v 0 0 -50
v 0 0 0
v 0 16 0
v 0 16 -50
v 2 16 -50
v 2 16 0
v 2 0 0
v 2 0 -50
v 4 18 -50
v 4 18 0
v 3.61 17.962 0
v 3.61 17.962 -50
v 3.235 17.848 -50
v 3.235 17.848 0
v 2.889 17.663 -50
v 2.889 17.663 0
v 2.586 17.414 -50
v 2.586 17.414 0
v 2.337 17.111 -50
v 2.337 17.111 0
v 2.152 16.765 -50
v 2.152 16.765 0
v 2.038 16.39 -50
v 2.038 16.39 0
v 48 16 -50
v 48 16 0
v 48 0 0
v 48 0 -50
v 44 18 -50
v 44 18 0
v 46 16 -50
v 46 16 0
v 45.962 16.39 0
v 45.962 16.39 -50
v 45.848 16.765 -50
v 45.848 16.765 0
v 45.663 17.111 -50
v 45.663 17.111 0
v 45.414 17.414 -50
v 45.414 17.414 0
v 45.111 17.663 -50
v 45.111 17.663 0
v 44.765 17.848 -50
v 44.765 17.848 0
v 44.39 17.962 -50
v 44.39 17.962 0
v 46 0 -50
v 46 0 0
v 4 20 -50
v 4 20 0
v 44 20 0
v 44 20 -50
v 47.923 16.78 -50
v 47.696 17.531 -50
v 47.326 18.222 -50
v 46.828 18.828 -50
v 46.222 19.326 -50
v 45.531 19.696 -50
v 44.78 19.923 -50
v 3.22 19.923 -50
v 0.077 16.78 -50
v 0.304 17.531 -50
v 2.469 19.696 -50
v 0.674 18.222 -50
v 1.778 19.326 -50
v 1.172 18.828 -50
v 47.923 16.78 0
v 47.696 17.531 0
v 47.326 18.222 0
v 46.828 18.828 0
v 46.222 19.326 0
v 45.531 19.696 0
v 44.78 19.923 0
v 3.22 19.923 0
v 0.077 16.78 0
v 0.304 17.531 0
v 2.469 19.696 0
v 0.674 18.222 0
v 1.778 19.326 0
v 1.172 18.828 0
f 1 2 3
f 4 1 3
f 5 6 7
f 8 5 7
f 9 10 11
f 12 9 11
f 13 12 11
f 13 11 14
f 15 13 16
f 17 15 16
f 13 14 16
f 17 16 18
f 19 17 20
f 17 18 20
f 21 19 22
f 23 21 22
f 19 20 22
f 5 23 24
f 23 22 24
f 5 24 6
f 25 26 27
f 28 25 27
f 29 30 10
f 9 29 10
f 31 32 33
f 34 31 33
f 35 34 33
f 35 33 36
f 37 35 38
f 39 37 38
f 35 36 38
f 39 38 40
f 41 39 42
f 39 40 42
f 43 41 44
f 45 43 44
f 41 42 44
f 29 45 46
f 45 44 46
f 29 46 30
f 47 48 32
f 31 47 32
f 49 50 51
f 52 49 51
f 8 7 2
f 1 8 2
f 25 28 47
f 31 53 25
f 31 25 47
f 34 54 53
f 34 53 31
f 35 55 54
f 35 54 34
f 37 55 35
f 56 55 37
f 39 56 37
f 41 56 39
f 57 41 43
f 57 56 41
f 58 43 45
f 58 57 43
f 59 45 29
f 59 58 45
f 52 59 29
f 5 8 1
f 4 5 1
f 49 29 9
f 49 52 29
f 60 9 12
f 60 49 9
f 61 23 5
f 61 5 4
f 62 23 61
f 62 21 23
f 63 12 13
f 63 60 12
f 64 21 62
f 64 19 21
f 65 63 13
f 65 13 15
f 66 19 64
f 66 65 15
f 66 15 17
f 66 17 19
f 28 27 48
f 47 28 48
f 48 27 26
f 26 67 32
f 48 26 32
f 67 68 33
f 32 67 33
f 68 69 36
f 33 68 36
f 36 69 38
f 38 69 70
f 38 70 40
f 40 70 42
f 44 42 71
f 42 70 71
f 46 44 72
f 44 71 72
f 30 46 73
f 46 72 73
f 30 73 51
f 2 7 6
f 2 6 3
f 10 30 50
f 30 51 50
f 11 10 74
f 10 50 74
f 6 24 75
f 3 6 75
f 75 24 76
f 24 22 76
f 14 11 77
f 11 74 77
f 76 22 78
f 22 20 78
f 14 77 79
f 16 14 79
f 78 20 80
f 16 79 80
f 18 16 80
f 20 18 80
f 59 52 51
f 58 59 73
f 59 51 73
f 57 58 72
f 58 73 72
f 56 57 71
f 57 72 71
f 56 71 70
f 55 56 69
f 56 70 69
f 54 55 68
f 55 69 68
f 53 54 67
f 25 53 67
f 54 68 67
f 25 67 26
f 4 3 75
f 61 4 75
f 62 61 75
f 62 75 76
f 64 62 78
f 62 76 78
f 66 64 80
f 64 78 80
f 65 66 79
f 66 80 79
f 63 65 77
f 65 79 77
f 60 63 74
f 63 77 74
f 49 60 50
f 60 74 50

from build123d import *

# Parameters (mm, degrees)
SM_BASE_FLANGE_1_DEPTH = 50


# Sheet-metal steps are written as plain solids
with BuildPart() as part:
    # Sketch 1 → Базовая кромка1 (new body)
    with BuildSketch(Plane.XY):
        with BuildLine():
            Line((0, 0), (0, 16))
            ThreePointArc((0, 16), (1.171572875, 18.828427125), (4, 20))
            Line((4, 20), (44, 20))
            ThreePointArc((44, 20), (46.828427125, 18.828427125), (48, 16))
            Line((48, 16), (48, 0))
            Line((48, 0), (46, 0))
            Line((46, 0), (46, 16))
            ThreePointArc((46, 16), (45.414213562, 17.414213562), (44, 18))
            Line((44, 18), (4, 18))
            ThreePointArc((4, 18), (2.585786438, 17.414213562), (2, 16))
            Line((2, 16), (2, 0))
            Line((2, 0), (0, 0))
        make_face()
    extrude(amount=-SM_BASE_FLANGE_1_DEPTH)


solid = part.part
